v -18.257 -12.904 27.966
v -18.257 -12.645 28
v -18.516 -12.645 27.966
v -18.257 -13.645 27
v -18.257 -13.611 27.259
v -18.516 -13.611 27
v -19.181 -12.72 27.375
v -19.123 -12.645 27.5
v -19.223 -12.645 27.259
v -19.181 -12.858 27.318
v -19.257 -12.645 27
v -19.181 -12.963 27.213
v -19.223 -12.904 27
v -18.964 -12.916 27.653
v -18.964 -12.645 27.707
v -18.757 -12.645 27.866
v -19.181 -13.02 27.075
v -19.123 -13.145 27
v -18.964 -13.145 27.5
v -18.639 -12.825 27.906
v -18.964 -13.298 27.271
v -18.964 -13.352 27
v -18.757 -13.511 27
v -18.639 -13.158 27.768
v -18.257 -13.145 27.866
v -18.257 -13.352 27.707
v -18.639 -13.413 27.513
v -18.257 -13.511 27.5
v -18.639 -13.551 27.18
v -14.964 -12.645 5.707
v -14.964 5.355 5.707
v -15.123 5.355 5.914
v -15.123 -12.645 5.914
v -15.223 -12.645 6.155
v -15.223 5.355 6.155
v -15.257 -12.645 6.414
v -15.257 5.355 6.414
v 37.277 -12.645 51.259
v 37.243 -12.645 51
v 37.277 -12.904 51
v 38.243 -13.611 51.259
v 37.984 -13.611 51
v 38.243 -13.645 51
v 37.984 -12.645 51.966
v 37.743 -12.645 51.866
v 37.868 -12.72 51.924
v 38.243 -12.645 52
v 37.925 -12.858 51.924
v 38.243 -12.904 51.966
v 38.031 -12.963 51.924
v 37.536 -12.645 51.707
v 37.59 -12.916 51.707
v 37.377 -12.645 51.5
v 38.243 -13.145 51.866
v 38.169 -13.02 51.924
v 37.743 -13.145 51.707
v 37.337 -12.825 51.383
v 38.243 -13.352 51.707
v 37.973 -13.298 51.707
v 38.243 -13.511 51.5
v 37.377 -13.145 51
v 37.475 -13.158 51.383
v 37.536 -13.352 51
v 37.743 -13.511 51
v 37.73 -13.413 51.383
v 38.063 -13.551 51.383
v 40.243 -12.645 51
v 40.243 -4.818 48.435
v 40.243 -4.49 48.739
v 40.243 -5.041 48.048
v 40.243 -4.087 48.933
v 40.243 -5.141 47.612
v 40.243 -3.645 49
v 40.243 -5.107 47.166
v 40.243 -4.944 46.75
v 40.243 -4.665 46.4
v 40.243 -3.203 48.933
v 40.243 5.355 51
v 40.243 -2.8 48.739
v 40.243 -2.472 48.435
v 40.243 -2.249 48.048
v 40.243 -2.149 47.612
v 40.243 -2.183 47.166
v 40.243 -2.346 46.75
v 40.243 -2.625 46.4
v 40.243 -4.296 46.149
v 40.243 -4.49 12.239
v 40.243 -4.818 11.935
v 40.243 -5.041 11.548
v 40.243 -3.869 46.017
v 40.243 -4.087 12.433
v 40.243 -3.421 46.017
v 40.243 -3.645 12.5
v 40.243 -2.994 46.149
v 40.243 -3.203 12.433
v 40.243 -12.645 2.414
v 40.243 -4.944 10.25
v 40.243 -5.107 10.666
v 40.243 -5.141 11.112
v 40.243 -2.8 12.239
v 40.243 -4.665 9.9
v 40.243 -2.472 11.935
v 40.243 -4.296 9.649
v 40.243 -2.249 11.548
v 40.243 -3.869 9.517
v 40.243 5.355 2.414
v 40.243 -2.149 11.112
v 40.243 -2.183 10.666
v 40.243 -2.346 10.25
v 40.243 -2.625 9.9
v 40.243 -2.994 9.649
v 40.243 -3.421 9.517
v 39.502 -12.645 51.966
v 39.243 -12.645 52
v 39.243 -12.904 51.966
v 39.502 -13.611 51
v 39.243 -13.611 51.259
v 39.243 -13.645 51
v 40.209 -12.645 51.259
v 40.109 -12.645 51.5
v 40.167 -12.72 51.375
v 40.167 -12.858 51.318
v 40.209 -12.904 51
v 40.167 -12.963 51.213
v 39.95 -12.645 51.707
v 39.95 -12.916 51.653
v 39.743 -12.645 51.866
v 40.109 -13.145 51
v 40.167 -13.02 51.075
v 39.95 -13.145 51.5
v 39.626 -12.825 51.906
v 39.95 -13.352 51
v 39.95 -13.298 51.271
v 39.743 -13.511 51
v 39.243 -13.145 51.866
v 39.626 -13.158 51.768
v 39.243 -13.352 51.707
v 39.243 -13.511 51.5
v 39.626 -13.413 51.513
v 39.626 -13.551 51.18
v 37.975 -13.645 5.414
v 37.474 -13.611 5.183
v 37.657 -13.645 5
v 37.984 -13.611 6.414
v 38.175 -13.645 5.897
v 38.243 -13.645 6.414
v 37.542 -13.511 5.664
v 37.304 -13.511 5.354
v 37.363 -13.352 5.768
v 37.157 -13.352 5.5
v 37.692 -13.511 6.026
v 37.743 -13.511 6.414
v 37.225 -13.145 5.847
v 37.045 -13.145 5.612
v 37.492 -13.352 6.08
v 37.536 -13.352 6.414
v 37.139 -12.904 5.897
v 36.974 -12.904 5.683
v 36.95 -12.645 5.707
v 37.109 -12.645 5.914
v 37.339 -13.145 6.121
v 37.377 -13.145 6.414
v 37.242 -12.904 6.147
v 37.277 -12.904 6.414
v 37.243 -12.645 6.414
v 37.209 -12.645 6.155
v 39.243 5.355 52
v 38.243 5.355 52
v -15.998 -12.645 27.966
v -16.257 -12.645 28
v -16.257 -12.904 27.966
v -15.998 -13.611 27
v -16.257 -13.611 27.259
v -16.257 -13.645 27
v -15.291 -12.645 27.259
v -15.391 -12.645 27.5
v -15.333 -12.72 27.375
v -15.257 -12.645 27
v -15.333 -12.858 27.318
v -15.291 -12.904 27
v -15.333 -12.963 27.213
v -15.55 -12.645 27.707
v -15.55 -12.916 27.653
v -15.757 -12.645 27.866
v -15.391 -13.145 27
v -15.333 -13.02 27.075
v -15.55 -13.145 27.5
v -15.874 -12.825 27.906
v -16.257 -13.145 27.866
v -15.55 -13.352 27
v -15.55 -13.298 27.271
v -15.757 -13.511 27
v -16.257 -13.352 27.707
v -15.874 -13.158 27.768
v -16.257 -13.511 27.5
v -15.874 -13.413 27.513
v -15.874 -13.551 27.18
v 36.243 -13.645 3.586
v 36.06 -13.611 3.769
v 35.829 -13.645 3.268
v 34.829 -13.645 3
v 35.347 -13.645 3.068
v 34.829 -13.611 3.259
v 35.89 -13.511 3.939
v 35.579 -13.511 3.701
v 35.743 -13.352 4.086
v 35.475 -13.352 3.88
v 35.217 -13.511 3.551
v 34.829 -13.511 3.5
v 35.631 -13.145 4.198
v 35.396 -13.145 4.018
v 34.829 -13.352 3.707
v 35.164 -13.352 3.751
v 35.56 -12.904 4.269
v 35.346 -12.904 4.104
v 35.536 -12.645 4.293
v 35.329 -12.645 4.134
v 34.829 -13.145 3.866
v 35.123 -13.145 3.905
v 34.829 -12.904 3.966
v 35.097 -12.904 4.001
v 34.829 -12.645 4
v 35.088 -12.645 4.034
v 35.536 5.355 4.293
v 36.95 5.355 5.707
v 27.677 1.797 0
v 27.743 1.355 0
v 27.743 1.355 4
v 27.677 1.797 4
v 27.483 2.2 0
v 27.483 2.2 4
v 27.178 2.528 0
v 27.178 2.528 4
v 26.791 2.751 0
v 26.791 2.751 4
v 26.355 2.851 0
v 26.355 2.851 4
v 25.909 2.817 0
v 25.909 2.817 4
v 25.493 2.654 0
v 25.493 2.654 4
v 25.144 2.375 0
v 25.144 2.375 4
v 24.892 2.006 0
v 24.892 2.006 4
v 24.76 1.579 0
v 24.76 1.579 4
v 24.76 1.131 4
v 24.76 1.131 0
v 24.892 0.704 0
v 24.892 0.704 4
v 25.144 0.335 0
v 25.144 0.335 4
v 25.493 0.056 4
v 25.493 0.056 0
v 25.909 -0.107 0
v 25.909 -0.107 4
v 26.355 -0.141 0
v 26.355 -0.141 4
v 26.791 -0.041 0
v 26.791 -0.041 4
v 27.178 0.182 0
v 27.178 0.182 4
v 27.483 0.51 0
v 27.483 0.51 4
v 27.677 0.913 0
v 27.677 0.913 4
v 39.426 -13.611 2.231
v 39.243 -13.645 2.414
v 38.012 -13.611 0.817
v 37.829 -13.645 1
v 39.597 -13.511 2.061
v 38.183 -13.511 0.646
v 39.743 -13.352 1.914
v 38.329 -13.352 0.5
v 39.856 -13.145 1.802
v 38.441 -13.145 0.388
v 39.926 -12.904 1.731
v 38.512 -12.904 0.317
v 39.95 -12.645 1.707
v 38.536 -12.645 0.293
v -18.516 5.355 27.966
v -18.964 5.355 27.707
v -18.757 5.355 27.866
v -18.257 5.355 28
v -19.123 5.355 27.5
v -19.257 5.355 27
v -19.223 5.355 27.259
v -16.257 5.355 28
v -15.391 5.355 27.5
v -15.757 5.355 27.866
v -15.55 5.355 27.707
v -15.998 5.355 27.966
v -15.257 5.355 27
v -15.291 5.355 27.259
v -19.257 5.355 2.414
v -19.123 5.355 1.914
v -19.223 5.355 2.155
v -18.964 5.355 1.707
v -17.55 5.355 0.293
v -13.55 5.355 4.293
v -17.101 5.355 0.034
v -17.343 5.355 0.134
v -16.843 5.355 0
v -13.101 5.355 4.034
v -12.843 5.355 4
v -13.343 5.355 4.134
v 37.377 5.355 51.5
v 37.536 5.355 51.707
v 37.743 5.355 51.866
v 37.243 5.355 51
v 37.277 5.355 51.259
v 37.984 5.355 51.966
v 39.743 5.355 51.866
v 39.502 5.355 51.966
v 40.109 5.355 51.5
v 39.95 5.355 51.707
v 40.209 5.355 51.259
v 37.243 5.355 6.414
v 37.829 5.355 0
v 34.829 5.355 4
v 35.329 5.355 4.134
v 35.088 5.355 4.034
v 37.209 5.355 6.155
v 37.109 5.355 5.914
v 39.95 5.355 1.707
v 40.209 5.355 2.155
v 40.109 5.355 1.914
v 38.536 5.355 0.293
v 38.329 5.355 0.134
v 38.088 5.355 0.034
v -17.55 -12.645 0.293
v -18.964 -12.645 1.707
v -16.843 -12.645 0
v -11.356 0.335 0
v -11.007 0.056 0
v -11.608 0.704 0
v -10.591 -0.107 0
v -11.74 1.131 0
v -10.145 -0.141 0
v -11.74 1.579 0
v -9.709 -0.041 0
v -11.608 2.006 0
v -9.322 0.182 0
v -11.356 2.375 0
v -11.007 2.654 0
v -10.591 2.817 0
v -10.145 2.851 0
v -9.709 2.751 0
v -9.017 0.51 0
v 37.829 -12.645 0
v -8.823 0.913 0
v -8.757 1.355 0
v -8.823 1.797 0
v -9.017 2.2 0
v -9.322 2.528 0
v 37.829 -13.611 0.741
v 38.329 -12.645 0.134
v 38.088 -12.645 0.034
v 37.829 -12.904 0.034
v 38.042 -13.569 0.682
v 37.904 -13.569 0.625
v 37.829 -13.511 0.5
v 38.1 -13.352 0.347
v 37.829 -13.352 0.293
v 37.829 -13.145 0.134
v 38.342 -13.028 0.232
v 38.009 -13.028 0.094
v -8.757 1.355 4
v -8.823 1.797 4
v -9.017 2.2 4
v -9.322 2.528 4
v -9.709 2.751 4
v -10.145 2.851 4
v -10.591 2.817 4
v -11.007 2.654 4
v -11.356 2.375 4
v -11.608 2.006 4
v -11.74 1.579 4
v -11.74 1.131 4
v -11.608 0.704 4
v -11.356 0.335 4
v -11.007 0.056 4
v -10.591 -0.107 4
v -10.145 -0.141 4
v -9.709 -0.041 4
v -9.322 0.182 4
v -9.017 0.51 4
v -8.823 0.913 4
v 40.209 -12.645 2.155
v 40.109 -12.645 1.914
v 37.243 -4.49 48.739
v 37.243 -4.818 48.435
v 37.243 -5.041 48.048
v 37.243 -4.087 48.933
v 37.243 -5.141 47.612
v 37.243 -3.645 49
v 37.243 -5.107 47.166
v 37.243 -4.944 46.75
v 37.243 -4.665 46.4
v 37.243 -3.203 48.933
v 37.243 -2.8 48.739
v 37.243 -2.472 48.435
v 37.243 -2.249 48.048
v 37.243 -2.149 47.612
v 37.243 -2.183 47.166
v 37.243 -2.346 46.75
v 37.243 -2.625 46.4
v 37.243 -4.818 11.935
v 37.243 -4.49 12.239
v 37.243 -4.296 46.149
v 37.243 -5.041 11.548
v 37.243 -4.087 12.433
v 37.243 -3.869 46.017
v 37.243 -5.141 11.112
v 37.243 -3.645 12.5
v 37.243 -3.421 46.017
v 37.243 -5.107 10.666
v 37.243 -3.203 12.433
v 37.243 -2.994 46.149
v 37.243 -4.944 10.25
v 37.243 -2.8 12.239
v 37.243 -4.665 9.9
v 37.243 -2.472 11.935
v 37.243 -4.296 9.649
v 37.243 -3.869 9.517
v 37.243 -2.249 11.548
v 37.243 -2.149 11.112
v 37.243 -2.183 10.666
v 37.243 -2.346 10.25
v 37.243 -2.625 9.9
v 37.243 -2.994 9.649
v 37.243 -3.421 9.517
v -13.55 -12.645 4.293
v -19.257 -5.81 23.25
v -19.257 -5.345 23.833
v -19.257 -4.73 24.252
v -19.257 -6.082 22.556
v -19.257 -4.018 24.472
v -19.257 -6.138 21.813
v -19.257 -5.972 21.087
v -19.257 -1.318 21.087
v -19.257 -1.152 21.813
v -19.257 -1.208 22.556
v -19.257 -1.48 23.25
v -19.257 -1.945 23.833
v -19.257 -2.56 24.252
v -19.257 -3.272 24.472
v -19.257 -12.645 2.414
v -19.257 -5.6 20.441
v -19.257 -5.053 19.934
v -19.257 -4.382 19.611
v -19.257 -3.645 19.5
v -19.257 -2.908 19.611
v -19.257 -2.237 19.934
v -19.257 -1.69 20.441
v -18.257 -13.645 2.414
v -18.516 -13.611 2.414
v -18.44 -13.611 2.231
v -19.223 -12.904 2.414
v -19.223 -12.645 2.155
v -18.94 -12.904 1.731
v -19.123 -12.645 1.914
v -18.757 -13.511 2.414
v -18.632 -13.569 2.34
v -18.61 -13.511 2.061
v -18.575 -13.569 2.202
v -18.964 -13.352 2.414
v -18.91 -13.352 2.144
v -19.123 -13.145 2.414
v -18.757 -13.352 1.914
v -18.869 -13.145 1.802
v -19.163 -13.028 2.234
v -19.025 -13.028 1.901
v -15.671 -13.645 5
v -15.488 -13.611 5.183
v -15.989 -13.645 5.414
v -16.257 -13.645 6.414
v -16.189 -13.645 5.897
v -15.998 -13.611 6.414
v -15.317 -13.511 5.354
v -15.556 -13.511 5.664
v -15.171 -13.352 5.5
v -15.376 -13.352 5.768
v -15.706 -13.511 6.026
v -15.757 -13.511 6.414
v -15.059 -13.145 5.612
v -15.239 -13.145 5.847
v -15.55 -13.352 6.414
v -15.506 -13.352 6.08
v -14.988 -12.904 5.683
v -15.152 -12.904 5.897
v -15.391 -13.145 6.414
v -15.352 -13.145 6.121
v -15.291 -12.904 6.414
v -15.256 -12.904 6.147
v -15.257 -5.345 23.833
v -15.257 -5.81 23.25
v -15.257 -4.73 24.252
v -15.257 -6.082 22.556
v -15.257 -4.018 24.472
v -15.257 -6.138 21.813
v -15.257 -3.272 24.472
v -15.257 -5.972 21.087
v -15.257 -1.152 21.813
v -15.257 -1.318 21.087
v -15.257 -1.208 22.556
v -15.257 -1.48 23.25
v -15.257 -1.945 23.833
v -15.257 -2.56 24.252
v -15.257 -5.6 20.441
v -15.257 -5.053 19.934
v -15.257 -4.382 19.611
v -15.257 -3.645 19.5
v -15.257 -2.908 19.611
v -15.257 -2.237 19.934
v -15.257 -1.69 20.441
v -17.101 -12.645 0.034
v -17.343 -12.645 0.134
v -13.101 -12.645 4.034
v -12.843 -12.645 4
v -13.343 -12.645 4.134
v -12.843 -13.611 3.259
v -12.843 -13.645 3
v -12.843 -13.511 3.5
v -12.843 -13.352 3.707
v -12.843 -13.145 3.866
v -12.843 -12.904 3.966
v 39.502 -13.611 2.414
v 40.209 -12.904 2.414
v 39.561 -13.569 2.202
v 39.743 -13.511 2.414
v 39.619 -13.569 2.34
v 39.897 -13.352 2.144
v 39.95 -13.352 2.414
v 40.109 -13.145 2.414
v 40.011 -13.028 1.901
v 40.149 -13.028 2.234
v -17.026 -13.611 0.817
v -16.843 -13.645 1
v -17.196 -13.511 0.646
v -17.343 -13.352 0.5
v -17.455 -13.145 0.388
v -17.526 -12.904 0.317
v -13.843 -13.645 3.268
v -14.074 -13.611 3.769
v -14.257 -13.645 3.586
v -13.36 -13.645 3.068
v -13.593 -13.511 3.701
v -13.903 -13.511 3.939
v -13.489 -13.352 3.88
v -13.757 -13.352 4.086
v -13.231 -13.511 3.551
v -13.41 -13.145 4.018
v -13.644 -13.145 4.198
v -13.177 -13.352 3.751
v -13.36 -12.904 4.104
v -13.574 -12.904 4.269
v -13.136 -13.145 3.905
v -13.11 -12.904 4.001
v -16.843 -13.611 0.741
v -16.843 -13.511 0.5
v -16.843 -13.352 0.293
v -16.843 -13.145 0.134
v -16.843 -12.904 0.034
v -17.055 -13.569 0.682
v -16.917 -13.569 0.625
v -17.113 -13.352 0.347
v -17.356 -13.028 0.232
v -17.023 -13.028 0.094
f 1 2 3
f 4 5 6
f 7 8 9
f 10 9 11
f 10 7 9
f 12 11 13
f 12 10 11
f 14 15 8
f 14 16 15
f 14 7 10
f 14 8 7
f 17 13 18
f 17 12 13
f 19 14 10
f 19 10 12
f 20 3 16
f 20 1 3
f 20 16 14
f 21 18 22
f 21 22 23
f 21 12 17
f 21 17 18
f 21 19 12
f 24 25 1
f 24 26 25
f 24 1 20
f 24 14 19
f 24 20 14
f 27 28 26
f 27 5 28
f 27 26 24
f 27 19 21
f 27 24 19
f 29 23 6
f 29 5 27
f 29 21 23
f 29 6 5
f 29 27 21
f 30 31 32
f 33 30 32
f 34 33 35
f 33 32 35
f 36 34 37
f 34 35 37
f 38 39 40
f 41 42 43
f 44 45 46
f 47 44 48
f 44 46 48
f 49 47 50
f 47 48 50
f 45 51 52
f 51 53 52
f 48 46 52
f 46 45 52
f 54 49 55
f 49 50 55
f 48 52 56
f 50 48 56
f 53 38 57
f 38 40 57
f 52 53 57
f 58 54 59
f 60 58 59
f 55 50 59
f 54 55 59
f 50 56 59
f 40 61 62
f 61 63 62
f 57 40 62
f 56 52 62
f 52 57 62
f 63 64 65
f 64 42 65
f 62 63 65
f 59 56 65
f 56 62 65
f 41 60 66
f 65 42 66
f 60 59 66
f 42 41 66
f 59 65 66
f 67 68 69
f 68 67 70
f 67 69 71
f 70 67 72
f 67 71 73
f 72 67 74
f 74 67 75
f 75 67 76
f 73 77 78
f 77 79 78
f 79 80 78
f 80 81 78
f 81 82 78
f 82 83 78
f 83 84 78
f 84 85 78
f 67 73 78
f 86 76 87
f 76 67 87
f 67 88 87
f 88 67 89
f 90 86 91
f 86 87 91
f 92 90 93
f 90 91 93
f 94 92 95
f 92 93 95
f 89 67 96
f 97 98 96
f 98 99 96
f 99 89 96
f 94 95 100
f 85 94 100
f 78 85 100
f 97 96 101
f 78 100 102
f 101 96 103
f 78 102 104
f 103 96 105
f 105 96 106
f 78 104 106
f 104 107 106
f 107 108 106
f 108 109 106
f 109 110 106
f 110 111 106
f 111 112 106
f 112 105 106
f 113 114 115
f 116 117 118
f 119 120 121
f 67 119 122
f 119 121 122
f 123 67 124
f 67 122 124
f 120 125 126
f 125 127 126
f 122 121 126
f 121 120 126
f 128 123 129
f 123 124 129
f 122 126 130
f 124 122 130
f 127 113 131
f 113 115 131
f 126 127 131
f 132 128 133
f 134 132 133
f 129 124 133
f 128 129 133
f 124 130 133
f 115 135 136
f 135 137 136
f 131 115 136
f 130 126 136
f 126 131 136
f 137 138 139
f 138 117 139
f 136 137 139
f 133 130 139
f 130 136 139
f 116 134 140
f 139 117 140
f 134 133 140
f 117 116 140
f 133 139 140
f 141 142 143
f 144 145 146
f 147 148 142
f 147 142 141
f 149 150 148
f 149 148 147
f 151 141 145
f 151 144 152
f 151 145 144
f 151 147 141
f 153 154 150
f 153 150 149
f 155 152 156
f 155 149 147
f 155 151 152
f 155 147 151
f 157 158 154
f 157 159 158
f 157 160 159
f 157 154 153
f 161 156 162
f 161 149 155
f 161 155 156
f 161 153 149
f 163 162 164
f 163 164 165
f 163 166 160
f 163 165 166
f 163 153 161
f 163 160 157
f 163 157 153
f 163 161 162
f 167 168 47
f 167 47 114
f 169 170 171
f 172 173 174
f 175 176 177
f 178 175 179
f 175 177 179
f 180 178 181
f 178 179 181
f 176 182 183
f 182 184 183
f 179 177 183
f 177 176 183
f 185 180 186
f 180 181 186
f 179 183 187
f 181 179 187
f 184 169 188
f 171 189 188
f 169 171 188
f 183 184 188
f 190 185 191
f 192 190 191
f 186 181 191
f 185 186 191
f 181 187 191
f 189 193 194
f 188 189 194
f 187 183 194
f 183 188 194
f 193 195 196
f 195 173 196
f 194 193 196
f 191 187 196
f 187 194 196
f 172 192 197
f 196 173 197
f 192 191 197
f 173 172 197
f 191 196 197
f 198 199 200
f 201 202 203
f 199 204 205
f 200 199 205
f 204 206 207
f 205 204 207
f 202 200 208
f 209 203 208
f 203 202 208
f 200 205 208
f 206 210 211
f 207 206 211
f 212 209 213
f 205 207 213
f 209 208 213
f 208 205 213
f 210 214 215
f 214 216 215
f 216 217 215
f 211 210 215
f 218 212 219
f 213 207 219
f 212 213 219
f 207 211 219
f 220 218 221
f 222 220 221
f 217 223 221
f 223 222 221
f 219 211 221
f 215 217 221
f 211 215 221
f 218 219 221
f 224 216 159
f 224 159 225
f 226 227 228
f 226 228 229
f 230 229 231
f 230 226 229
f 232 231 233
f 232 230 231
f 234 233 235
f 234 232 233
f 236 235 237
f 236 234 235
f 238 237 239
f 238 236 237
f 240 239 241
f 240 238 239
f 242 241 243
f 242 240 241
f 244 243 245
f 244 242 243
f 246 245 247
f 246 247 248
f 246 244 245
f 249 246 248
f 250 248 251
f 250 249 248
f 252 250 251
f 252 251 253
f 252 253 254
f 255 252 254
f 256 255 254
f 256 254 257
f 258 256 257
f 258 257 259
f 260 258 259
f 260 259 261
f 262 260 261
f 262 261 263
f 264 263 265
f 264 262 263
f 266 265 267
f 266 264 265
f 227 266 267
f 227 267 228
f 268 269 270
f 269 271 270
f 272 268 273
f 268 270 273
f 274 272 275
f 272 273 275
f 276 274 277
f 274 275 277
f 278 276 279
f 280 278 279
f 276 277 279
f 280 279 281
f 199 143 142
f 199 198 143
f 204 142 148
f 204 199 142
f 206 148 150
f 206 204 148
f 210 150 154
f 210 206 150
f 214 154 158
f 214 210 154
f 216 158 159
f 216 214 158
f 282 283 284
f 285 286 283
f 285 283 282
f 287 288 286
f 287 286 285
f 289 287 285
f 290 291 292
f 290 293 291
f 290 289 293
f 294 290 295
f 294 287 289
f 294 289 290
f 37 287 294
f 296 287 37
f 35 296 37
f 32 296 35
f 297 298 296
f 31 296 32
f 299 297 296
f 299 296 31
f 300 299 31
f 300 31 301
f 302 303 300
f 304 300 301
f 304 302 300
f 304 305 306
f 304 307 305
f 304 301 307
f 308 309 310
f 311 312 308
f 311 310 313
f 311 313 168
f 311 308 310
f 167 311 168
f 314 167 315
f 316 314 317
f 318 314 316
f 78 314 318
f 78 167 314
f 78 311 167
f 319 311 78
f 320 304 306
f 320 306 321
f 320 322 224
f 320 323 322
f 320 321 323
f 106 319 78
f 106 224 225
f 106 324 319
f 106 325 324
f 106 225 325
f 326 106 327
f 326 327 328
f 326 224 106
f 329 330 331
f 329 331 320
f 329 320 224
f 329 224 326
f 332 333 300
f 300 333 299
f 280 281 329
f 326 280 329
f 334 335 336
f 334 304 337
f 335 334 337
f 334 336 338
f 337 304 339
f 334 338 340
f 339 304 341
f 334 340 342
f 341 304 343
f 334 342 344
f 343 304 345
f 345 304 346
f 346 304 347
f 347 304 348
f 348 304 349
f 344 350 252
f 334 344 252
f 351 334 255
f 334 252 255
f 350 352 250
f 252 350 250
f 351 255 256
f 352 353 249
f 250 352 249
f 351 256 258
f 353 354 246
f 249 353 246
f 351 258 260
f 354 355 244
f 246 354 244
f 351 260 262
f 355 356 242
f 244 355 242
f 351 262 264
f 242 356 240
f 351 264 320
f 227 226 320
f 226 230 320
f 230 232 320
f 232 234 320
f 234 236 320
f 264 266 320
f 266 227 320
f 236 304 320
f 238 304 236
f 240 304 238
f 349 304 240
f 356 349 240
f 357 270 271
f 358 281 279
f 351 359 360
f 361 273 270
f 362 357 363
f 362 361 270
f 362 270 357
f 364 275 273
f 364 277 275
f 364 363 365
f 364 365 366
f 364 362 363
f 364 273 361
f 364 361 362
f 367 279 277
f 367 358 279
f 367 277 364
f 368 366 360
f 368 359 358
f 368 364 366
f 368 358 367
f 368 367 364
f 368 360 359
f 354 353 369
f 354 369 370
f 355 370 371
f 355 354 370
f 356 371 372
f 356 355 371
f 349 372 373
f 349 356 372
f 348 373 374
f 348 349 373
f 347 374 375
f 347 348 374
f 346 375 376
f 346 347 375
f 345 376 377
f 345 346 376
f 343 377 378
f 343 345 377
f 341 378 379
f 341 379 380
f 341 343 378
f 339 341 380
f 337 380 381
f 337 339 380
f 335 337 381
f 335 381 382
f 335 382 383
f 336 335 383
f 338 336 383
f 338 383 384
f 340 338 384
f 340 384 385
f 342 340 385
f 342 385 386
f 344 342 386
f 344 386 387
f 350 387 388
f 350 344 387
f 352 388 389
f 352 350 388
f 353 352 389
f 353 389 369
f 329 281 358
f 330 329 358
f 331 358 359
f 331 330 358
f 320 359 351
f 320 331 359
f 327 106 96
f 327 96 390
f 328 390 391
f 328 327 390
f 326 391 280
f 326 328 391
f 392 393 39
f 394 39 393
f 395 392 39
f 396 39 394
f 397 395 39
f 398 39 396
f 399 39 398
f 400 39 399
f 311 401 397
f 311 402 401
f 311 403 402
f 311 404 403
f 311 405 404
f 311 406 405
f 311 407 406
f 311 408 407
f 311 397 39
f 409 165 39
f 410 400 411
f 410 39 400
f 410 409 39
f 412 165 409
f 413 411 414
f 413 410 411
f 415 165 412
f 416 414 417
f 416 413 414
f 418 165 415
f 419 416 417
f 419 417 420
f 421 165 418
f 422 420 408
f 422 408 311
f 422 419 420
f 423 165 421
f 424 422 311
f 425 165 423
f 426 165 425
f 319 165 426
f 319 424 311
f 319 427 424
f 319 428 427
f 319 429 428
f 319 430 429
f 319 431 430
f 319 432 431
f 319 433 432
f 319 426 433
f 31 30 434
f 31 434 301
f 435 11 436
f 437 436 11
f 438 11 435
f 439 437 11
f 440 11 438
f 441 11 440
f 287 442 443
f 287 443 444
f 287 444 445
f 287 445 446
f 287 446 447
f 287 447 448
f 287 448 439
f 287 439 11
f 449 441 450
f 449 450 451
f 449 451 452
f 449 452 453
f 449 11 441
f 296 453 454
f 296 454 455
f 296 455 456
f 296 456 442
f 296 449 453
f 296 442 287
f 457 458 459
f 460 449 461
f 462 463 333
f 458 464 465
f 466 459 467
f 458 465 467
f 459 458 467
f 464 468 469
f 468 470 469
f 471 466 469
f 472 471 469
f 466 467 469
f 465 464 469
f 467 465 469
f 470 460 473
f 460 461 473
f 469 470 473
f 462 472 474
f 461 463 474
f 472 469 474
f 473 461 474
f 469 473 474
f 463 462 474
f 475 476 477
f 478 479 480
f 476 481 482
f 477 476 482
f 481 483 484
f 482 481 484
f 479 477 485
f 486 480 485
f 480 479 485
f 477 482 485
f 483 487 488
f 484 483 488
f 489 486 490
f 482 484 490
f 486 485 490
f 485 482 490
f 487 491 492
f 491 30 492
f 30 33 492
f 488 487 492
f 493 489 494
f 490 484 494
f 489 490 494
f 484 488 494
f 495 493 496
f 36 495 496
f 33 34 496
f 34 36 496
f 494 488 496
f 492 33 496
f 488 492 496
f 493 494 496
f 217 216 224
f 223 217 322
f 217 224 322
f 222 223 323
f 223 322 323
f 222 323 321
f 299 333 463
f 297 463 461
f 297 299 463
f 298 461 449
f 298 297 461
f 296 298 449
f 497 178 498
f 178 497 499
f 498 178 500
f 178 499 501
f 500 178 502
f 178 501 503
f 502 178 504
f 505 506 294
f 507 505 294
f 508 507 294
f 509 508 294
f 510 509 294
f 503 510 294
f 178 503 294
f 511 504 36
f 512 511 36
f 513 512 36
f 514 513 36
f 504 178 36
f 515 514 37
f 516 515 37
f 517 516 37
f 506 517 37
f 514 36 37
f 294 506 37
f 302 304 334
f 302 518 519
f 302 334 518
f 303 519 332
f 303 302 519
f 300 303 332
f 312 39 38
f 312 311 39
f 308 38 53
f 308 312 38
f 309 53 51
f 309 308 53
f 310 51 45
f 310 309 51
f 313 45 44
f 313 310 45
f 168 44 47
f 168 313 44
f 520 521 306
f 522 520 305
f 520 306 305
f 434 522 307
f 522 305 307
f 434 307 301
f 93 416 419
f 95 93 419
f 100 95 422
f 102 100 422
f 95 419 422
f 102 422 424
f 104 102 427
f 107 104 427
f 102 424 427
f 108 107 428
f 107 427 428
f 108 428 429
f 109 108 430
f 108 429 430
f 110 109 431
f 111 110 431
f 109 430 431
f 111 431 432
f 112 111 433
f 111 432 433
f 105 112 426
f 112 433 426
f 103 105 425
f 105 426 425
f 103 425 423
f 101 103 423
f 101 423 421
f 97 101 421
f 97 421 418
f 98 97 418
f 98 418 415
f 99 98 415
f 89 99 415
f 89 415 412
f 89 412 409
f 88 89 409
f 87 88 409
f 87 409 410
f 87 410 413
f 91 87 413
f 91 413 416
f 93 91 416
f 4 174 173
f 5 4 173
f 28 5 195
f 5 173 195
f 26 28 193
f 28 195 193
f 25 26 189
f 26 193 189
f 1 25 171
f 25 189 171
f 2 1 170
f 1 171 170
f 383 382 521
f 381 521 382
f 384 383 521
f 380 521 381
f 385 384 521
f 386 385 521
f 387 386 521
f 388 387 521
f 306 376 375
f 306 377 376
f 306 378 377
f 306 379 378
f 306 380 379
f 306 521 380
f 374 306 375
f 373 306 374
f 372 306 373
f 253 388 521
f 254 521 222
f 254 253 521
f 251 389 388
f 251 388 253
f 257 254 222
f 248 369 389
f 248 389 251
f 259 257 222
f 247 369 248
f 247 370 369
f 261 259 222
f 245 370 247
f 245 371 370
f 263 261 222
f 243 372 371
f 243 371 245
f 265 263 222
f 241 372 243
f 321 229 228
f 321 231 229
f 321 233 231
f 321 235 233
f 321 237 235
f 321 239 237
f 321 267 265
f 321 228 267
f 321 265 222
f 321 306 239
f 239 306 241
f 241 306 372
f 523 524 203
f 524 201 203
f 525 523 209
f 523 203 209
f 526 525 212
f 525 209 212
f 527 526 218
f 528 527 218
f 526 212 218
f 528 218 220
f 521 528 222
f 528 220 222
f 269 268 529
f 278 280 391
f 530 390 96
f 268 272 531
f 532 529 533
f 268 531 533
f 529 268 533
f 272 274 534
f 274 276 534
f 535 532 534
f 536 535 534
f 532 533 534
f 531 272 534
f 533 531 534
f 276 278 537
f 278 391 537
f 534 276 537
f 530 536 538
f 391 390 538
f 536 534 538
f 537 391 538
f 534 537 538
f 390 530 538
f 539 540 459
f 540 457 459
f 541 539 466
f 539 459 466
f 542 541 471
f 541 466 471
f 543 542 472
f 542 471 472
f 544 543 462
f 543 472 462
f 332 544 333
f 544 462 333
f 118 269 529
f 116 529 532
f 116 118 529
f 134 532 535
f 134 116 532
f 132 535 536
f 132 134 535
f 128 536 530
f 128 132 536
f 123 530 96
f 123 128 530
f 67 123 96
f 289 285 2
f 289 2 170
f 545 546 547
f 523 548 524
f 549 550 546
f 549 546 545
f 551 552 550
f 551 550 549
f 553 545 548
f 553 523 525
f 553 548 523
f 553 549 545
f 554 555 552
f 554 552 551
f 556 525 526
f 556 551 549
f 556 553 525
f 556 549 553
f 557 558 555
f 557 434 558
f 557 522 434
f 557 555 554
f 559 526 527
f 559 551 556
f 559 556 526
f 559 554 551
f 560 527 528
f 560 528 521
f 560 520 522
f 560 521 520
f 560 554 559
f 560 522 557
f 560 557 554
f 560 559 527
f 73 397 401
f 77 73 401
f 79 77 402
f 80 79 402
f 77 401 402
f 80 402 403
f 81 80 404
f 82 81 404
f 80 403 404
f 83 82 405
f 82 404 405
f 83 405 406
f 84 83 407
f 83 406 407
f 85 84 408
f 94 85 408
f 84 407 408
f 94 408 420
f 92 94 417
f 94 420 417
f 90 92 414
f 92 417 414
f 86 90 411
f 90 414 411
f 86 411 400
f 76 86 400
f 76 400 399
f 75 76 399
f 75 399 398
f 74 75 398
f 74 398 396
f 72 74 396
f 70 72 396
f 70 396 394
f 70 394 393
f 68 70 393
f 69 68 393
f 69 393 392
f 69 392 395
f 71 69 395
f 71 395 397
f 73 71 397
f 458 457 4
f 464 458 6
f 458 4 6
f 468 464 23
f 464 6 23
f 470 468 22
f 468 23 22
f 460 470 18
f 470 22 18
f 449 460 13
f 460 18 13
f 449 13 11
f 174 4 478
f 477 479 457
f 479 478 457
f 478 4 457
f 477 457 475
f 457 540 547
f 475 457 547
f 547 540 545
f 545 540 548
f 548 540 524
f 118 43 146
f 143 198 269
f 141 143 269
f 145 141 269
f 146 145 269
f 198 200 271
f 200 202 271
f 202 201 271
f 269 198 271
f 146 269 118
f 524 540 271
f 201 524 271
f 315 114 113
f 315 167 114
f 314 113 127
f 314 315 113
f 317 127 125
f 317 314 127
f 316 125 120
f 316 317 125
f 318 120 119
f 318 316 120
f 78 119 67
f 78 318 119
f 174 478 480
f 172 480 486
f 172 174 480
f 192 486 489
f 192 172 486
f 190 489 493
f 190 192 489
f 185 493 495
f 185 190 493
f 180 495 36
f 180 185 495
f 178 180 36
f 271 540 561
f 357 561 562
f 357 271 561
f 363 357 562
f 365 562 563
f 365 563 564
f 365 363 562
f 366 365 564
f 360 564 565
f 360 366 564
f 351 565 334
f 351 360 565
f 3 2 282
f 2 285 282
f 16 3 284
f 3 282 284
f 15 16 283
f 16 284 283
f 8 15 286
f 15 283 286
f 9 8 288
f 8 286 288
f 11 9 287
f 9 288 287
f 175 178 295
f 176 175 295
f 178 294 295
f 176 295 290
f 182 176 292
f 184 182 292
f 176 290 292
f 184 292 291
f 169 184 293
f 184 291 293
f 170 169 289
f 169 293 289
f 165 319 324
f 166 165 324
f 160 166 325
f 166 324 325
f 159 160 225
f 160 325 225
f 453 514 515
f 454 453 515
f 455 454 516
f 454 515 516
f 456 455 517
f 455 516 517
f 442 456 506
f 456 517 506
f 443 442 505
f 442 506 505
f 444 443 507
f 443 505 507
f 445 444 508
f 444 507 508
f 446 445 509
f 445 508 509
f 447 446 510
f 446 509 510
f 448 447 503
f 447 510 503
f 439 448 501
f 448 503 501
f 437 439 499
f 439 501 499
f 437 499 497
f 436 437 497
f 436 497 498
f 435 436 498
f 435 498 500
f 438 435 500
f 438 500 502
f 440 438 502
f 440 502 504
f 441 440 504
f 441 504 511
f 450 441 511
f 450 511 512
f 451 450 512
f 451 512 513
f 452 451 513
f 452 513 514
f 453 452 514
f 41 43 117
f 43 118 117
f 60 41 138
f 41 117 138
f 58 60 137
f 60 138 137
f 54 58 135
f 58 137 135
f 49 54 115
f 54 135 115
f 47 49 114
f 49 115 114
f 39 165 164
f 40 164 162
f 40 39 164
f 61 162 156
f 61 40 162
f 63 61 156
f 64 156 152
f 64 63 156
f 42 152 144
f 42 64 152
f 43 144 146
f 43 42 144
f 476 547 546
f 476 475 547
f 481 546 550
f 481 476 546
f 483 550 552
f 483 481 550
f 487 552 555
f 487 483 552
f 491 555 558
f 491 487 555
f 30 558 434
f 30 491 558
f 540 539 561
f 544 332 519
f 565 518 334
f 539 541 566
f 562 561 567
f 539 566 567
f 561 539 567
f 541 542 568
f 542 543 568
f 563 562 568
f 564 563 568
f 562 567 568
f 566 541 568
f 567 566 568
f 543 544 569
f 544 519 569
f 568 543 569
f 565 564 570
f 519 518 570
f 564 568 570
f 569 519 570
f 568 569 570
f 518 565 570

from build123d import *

# Parameters (mm, degrees)
SKETCH_1_W          = 59.5
SKETCH_1_H          = 19
SKETCH_1_R          = 1.5
EXTRUDE_1_DEPTH     = 4
SKETCH_2_W          = 4
SKETCH_2_H          = 19
EXTRUDE_2_DEPTH     = 24
SKETCH_3_W          = 3
SKETCH_3_H          = 19
EXTRUDE_3_DEPTH     = 48
SKETCH_4_R          = 2.5
CUT_EXTRUDE_1_DEPTH = 48
SKETCH_5_R          = 1.5
CUT_EXTRUDE_2_DEPTH = 48
CHAMFER_1_SIZE      = 2
FILLET_1_R          = 1


with BuildPart() as part:
    # 草图1 → 凸台-拉伸1 (new body)
    with BuildSketch(Plane.XY):
        with Locations((10.493245584, -4.144948765)):
            Rectangle(SKETCH_1_W, SKETCH_1_H)
        with Locations((-10.256754416, 1.355051235)):
            Circle(SKETCH_1_R, mode=Mode.SUBTRACT)
        with Locations((26.243245584, 1.355051235)):
            Circle(SKETCH_1_R, mode=Mode.SUBTRACT)
    extrude(amount=EXTRUDE_1_DEPTH)

    # 草图2 → 凸台-拉伸2 (add)
    with BuildSketch(Plane.XY.offset(4)):
        with Locations((-17.256754416, -4.144948765)):
            Rectangle(SKETCH_2_W, SKETCH_2_H)
    extrude(amount=EXTRUDE_2_DEPTH)

    # 草图3 → 凸台-拉伸3 (add)
    with BuildSketch(Plane.XY.offset(4)):
        with Locations((38.743245584, -4.144948765)):
            Rectangle(SKETCH_3_W, SKETCH_3_H)
    extrude(amount=EXTRUDE_3_DEPTH)

    # 草图4 → 切除-拉伸1 (cut)
    with BuildSketch(Plane(origin=(-15.256754416, 0, 0), x_dir=(0, 0, -1), z_dir=(1, 0, 0))):
        with Locations((-22, -3.644948765)):
            Circle(SKETCH_4_R)
    extrude(amount=-CUT_EXTRUDE_1_DEPTH, mode=Mode.SUBTRACT)

    # 草图5 → 切除-拉伸2 (cut)
    with BuildSketch(Plane.ZY.offset(-37.243245584)):
        with Locations((11, -3.644948765)):
            Circle(SKETCH_5_R)
        with Locations((47.5, -3.644948765)):
            Circle(SKETCH_5_R)
    extrude(amount=-CUT_EXTRUDE_2_DEPTH, mode=Mode.SUBTRACT)

    # 倒角1
    chamfer_1_edges = [part.edges().sort_by_distance(p)[0] for p in [
        (-15.256754416, -4.144948765, 4),
        (37.243245584, -4.144948765, 4),
        (-19.256754416, -4.144948765, 0),
        (40.243245584, -4.144948765, 0),
    ]]
    chamfer(chamfer_1_edges, length=CHAMFER_1_SIZE)

    # 圆角1
    fillet_1_edges = [part.edges().sort_by_distance(p)[0] for p in [
        (-17.256754416, -13.644948765, 28),
        (-15.256754416, -4.144948765, 28),
        (-15.256754416, -13.644948765, 17),
        (-19.256754416, -4.144948765, 28),
        (37.243245584, -13.644948765, 29),
        (37.243245584, -4.144948765, 52),
        (38.743245584, -13.644948765, 52),
        (40.243245584, -4.144948765, 52),
        (40.243245584, -4.144948765, 2),
        (10.493245584, -13.644948765, 0),
        (-17.256754416, -4.144948765, 0),
        (38.243245584, -4.144948765, 0),
        (10.993245584, -13.644948765, 4),
        (-18.256754416, -13.644948765, 1),
        (39.243245584, -13.644948765, 1),
        (-19.256754416, -4.144948765, 2),
        (37.243245584, -4.144948765, 6),
        (-13.256754416, -4.144948765, 4),
        (35.243245584, -4.144948765, 4),
        (-15.256754416, -4.144948765, 6),
        (40.243245584, -13.644948765, 27),
        (36.243245584, -13.644948765, 5),
        (-19.256754416, -13.644948765, 15),
        (-14.256754416, -13.644948765, 5),
    ]]
    fillet(fillet_1_edges, radius=FILLET_1_R)


solid = part.part
